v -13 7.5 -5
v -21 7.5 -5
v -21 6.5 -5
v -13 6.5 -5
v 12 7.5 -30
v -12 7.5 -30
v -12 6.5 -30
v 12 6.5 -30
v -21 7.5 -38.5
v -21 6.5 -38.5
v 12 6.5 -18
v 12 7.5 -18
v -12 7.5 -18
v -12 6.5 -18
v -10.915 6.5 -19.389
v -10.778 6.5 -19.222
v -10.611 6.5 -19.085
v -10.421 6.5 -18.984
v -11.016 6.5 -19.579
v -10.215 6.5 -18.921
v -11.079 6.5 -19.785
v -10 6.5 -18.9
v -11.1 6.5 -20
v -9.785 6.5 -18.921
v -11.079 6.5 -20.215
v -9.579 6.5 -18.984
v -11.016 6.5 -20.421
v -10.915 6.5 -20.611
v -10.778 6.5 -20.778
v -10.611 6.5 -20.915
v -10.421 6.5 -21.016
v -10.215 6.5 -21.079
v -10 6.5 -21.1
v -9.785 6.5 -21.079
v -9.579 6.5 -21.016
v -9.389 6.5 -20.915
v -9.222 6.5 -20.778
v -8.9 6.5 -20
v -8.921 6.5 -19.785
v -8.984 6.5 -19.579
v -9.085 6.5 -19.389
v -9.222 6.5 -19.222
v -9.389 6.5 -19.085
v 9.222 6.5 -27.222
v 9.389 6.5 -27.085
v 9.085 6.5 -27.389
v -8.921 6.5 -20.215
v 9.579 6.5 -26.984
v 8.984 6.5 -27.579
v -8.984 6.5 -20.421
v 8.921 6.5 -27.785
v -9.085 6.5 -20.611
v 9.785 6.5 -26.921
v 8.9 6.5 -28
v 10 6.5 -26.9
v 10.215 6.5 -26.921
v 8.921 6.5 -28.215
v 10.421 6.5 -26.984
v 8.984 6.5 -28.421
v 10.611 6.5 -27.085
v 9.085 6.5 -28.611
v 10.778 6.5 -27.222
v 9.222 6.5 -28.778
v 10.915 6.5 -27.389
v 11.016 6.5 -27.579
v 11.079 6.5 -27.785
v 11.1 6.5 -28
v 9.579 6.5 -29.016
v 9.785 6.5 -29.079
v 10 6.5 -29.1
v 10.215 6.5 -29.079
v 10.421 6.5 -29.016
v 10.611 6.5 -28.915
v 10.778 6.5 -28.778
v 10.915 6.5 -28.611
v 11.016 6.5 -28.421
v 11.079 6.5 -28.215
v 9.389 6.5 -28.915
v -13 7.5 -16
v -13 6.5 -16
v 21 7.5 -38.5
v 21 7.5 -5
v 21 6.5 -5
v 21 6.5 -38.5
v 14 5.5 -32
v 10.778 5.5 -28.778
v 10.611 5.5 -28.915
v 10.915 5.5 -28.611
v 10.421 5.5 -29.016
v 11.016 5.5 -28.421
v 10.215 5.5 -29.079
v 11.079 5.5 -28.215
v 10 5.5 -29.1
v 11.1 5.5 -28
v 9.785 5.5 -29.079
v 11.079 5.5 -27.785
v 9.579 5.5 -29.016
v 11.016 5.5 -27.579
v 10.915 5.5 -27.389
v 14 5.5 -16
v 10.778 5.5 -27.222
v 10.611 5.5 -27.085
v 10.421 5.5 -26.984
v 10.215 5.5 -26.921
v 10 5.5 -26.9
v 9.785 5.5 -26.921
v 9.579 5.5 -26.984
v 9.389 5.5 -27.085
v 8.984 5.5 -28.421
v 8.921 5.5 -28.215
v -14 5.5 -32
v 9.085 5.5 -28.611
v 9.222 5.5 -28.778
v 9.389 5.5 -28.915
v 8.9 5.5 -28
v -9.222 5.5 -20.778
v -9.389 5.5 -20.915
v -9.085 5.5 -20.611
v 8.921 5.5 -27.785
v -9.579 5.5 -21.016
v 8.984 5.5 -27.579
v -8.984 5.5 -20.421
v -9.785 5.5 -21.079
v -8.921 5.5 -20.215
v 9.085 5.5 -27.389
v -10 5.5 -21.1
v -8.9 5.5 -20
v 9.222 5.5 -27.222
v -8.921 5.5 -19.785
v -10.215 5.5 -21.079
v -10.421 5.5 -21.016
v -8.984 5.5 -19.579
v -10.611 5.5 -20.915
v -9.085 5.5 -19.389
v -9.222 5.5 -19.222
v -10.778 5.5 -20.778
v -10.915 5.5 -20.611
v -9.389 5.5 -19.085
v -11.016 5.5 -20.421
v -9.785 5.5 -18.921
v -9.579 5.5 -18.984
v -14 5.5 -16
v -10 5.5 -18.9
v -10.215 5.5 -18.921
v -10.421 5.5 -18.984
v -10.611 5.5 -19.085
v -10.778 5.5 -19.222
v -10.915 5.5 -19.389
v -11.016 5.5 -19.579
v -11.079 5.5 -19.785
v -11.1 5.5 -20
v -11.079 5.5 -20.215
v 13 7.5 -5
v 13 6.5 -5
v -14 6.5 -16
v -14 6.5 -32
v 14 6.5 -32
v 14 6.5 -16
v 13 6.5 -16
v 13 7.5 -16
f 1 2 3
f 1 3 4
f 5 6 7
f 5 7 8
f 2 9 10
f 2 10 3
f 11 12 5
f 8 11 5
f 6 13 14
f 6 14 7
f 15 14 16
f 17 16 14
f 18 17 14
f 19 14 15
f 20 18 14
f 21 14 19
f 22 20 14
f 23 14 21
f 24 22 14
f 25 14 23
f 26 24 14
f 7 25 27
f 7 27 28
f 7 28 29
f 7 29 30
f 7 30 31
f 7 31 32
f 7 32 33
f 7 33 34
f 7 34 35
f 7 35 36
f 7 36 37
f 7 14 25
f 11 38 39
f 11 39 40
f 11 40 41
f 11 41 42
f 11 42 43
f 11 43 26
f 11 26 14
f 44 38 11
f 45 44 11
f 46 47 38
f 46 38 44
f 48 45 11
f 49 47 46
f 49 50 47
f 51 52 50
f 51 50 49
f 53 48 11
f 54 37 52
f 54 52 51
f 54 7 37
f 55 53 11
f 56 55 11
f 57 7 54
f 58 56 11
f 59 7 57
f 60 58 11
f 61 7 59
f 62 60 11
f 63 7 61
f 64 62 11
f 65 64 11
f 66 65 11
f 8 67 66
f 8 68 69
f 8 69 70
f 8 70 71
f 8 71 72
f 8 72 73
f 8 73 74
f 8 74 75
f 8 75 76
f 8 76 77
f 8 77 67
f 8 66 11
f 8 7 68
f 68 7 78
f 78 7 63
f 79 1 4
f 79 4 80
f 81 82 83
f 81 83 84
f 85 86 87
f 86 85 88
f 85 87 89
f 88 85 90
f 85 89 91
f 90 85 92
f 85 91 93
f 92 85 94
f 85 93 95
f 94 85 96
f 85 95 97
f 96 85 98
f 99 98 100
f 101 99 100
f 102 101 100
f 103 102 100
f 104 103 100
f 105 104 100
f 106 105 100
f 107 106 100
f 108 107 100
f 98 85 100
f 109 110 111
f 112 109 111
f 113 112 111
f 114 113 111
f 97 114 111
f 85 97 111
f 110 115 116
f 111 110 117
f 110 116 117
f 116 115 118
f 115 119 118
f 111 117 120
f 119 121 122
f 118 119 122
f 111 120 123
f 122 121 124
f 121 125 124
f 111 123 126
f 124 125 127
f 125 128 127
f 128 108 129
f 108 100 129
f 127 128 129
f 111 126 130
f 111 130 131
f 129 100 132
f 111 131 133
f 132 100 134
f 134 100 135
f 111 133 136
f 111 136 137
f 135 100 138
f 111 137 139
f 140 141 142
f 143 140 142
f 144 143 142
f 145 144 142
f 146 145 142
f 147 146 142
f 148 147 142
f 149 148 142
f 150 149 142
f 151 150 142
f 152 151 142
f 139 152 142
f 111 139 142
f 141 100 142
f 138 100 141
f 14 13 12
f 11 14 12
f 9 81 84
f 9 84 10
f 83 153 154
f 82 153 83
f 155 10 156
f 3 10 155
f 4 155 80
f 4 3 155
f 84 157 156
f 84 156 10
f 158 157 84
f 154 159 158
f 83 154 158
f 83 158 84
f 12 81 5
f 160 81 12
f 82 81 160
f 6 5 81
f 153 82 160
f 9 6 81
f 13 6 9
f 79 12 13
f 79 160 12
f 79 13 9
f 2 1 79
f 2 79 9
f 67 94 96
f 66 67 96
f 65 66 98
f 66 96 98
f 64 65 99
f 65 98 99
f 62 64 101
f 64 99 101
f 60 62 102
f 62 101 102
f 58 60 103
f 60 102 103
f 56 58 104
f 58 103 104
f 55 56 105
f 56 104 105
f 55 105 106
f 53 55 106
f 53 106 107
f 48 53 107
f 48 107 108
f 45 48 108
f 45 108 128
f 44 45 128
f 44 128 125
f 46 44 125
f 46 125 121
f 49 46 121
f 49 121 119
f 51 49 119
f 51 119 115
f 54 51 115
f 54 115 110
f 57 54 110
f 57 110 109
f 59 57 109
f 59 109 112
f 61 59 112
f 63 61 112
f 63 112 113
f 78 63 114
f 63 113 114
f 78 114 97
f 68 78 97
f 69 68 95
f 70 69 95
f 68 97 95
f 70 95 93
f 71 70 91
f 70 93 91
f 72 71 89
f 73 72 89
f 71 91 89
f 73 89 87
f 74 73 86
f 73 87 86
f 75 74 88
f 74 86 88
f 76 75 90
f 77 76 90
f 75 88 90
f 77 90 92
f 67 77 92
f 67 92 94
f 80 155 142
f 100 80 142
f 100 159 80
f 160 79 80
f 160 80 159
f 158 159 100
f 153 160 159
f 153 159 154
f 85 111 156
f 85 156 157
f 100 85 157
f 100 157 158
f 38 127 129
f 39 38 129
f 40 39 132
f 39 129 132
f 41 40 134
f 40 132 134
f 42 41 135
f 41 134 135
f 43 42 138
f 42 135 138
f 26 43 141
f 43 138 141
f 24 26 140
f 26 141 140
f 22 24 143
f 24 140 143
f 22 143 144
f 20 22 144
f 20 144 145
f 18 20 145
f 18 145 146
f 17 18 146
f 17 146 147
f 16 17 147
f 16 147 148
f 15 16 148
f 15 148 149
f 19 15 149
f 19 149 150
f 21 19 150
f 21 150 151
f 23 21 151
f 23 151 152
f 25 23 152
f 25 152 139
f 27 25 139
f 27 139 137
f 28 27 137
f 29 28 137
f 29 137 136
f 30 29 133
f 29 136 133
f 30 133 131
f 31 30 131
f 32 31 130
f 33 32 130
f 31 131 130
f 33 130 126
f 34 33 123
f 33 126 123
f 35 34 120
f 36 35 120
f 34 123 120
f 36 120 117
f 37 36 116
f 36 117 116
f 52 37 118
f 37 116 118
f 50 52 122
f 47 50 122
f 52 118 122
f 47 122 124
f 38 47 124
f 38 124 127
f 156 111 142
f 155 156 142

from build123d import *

# Parameters (mm, degrees)
PAD113_DEPTH    = 2
SKETCH171_W     = 24
SKETCH171_H     = 12
POCKET010_DEPTH = 1
SKETCH172_W     = 46.237046
SKETCH172_H     = 37.182623
SKETCH172_W_2   = 28
SKETCH172_H_2   = 16
POCKET011_DEPTH = 1
SKETCH301_R     = 1.1
POCKET046_DEPTH = 5


with BuildPart() as part:
    # Sketch170 → Pad113 (new body)
    with BuildSketch(Plane.XZ):
        Polygon((21, -5), (21, -38.5), (-21, -38.5), (-21, -5), (-13, -5), (-13, -16), (13, -16), (13, -5), align=None)
    extrude(amount=PAD113_DEPTH)

    # Sketch171 (on Face9 of Pad113) → Pocket010 (cut)
    with BuildSketch(Plane(origin=(0, 0, 0), x_dir=(1, 0, 0), z_dir=(0, 1, 0))):
        with Locations((0, 24)):
            Rectangle(SKETCH171_W, SKETCH171_H)
    extrude(amount=-POCKET010_DEPTH, mode=Mode.SUBTRACT)

    # Sketch172 (on Face5 of Pocket010) → Pocket011 (cut)
    with BuildSketch(Plane.XZ.offset(2)):
        with Locations((0, -21.400319)):
            Rectangle(SKETCH172_W, SKETCH172_H)
        with Locations((0, -24)):
            Rectangle(SKETCH172_W_2, SKETCH172_H_2, mode=Mode.SUBTRACT)
    extrude(amount=-POCKET011_DEPTH, mode=Mode.SUBTRACT)

    # Sketch301 (on Face22 of Pocket011) → Pocket046 (cut)
    with BuildSketch(Plane.XZ.offset(2)):
        with Locations((10, -28)):
            Circle(SKETCH301_R)
        with Locations((-10, -20)):
            Circle(SKETCH301_R)
    extrude(amount=-POCKET046_DEPTH, mode=Mode.SUBTRACT)


with BuildPart() as part_1:
    # Body013 placement: moved
    add(part.part.moved(Location((0, 7.5, 0))))


solid = part_1.part
